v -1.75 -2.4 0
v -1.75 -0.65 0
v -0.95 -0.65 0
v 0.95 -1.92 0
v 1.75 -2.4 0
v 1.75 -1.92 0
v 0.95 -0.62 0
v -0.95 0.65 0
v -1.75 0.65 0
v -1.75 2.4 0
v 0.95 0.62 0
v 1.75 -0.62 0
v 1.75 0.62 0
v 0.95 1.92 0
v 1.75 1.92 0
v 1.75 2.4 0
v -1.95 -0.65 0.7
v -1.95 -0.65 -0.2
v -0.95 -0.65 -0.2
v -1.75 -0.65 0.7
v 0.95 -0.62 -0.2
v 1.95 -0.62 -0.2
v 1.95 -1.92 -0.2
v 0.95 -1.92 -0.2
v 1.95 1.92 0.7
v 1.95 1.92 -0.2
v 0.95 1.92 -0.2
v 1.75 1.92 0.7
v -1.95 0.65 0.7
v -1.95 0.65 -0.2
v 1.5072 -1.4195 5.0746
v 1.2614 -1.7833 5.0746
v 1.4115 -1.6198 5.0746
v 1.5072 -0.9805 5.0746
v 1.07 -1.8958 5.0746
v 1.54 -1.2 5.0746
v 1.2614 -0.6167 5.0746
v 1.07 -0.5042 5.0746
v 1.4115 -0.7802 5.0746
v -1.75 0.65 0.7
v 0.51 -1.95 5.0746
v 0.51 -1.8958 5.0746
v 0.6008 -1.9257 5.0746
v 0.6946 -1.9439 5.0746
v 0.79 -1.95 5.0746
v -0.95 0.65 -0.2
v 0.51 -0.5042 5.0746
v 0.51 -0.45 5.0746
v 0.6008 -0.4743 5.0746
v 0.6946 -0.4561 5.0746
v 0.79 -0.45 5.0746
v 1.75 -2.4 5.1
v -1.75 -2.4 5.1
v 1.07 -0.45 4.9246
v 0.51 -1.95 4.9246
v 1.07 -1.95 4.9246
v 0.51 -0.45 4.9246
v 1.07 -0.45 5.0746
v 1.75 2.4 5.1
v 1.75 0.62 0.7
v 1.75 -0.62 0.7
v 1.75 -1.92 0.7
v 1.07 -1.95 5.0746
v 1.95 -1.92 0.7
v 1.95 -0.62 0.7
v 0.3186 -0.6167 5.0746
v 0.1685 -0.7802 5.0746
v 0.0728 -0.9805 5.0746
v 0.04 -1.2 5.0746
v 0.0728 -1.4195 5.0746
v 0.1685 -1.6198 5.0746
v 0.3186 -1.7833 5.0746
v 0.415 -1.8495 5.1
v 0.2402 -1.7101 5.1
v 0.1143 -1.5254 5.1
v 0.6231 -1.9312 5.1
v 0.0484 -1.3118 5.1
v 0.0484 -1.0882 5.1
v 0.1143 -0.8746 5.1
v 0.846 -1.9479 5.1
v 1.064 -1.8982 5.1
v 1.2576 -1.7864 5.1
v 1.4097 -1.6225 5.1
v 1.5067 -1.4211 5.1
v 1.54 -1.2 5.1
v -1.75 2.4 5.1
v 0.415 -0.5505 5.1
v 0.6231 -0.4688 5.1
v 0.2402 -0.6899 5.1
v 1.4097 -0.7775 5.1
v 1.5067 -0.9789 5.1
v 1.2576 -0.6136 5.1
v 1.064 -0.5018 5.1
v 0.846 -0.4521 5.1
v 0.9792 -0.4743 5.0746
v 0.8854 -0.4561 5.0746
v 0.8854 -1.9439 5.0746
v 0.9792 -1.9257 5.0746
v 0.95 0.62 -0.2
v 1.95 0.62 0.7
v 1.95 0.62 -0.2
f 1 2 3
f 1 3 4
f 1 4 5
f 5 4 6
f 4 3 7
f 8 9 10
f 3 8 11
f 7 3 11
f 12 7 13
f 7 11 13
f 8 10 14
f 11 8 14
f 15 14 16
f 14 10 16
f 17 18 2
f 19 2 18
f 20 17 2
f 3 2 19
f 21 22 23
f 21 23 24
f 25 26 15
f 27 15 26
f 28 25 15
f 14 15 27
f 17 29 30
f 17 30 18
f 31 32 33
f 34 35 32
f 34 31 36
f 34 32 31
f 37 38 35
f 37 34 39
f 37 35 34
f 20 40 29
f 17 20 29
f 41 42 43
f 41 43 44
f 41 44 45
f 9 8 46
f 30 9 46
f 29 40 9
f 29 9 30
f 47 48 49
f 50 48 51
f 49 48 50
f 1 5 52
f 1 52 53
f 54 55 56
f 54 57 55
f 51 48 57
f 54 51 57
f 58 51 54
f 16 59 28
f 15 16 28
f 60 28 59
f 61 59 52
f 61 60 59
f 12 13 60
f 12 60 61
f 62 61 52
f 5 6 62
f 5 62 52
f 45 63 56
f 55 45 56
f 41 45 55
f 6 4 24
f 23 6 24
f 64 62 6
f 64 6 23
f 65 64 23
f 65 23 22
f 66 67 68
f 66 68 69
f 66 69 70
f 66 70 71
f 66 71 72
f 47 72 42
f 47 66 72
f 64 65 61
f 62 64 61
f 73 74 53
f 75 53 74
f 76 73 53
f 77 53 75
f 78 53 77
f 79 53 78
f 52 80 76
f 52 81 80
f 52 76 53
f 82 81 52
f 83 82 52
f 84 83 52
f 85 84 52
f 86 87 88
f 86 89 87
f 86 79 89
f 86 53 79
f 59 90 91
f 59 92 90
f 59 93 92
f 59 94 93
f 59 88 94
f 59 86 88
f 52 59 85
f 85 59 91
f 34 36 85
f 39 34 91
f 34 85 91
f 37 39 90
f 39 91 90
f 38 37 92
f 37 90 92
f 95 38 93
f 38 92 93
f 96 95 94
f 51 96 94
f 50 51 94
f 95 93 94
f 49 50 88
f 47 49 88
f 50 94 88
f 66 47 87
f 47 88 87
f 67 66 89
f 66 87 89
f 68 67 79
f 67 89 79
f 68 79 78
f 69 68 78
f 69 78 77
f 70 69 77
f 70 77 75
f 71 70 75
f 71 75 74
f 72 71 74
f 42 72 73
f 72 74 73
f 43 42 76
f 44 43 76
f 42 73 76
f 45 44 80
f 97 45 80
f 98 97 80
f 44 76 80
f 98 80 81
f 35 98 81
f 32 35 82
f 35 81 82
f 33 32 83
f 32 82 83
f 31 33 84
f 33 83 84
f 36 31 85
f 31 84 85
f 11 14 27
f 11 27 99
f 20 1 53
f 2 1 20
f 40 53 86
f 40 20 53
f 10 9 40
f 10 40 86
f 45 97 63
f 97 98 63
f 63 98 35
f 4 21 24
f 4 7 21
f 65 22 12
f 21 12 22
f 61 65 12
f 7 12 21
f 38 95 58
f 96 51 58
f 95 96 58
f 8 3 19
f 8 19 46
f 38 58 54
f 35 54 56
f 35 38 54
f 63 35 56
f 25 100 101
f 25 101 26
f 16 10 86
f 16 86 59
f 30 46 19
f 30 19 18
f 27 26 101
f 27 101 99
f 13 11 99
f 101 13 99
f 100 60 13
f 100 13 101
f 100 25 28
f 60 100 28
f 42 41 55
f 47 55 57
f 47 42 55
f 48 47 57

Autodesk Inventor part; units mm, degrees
ref_plane "YZ Plane" through (0, 0, 0) normal (1, 0, 0) x (0, 1, 0)
ref_plane "XZ Plane" through (0, 0, 0) normal (0, 1, 0) x (-1, 0, 0)
ref_plane "XY Plane" through (0, 0, 0) normal (0, 0, 1) x (1, 0, 0)
sketch "Sketch1" plane through (0, 0, 0) normal (0, 0, 1) x (1, 0, 0)
  line L0 (1.75, -2.4) -> (-1.75, -2.4)
  line L1 (-1.75, -2.4) -> (-1.75, 2.4)
  line L2 (-1.75, 2.4) -> (1.75, 2.4)
  line L3 (1.75, 2.4) -> (1.75, -2.4)
  line L4 (1.75, -2.4) -> (-1.75, 2.4) construction
  line L5 (-1.75, -2.4) -> (1.75, 2.4) construction
  point P0 (0, 0)
  dimension "d0" = 3.5
  dimension "d1" = 4.8
extrude "Extrusion1" add sketch "Sketch1" along normal blind 5.1
sketch "Sketch2" plane through (0, 0, 5.1) normal (0, 0, 1) x (1, 0, 0)
  circle A0 centre (0.79, -1.2) radius 0.75
  line L0 (-1.75, 2.4) -> (-1.75, -2.4) projected
  point P0 (0, 0)
  dimension "d4" = 1.5
  dimension "d5" = 1.2
  dimension "d6" = 2.54
extrude "Extrusion2" cut sketch "Sketch2" against normal blind 0.0254
sketch "Sketch3" plane through (0.79, -1.2, 5.0746) normal (0, 0, 1) x (1, 0, 0)
  circle A0 centre (0, 0) radius 0.75 projected
  line L0 (0.28, -0.75) -> (-0.28, -0.75)
  line L1 (-0.28, -0.75) -> (-0.28, 0.75)
  line L2 (-0.28, 0.75) -> (0.28, 0.75)
  line L3 (0.28, 0.75) -> (0.28, -0.75)
  line L4 (0.28, -0.75) -> (-0.28, 0.75) construction
  line L5 (-0.28, -0.75) -> (0.28, 0.75) construction
  point P0 (-0.79, 1.2)
  point P1 (0, 0.75)
  dimension "d9" = 0.56
extrude "Extrusion3" cut sketch "Sketch3" against normal blind 0.15 contours L3 A0 L1 | A0 L2 L3 | L3 L0 A0 | A0 L1 L2 | L0 L1 A0
sketch "Sketch4" plane through (0, 0, 0) normal (0, 0, -1) x (-1, 0, 0)
  line L0 (-1.95, 1.92) -> (-0.95, 1.92)
  line L1 (-0.95, 1.92) -> (-0.95, 0.62)
  line L2 (-0.95, 0.62) -> (-1.95, 0.62)
  line L3 (-1.95, 0.62) -> (-1.95, 1.92)
  line L4 (-1.95, -0.62) -> (-0.95, -0.62)
  line L5 (-0.95, -0.62) -> (-0.95, -1.92)
  line L6 (-0.95, -1.92) -> (-1.95, -1.92)
  line L7 (-1.95, -1.92) -> (-1.95, -0.62)
  line L8 (0.95, 0.65) -> (1.95, 0.65)
  line L9 (1.95, 0.65) -> (1.95, -0.65)
  line L10 (1.95, -0.65) -> (0.95, -0.65)
  line L11 (0.95, -0.65) -> (0.95, 0.65)
  line L12 (1.75, -2.4) -> (1.75, 2.4) projected
  line L13 (-1.75, 2.4) -> (-1.75, -2.4) projected
  line L14 (-1.95, 1.27) -> (-0.95, 1.27) construction
  line L15 (-1.95, -1.27) -> (-0.95, -1.27) construction
  point P0 (0, 0)
  point P1 (0.95, 0)
  dimension "d12" = 1
  dimension "d13" = 1.3
  dimension "d14" = 0.2
  dimension "d15" = 0.2
  dimension "d16" = 2.54
  dimension "d17" = 1.27
extrude "Extrusion4" add sketch "Sketch4" along normal blind 0.2 and the other way blind 0.7
equation "\"d15\" = d14"
equation "\"d17\" = 0.5 * d16"
properties part number "SM42W"
